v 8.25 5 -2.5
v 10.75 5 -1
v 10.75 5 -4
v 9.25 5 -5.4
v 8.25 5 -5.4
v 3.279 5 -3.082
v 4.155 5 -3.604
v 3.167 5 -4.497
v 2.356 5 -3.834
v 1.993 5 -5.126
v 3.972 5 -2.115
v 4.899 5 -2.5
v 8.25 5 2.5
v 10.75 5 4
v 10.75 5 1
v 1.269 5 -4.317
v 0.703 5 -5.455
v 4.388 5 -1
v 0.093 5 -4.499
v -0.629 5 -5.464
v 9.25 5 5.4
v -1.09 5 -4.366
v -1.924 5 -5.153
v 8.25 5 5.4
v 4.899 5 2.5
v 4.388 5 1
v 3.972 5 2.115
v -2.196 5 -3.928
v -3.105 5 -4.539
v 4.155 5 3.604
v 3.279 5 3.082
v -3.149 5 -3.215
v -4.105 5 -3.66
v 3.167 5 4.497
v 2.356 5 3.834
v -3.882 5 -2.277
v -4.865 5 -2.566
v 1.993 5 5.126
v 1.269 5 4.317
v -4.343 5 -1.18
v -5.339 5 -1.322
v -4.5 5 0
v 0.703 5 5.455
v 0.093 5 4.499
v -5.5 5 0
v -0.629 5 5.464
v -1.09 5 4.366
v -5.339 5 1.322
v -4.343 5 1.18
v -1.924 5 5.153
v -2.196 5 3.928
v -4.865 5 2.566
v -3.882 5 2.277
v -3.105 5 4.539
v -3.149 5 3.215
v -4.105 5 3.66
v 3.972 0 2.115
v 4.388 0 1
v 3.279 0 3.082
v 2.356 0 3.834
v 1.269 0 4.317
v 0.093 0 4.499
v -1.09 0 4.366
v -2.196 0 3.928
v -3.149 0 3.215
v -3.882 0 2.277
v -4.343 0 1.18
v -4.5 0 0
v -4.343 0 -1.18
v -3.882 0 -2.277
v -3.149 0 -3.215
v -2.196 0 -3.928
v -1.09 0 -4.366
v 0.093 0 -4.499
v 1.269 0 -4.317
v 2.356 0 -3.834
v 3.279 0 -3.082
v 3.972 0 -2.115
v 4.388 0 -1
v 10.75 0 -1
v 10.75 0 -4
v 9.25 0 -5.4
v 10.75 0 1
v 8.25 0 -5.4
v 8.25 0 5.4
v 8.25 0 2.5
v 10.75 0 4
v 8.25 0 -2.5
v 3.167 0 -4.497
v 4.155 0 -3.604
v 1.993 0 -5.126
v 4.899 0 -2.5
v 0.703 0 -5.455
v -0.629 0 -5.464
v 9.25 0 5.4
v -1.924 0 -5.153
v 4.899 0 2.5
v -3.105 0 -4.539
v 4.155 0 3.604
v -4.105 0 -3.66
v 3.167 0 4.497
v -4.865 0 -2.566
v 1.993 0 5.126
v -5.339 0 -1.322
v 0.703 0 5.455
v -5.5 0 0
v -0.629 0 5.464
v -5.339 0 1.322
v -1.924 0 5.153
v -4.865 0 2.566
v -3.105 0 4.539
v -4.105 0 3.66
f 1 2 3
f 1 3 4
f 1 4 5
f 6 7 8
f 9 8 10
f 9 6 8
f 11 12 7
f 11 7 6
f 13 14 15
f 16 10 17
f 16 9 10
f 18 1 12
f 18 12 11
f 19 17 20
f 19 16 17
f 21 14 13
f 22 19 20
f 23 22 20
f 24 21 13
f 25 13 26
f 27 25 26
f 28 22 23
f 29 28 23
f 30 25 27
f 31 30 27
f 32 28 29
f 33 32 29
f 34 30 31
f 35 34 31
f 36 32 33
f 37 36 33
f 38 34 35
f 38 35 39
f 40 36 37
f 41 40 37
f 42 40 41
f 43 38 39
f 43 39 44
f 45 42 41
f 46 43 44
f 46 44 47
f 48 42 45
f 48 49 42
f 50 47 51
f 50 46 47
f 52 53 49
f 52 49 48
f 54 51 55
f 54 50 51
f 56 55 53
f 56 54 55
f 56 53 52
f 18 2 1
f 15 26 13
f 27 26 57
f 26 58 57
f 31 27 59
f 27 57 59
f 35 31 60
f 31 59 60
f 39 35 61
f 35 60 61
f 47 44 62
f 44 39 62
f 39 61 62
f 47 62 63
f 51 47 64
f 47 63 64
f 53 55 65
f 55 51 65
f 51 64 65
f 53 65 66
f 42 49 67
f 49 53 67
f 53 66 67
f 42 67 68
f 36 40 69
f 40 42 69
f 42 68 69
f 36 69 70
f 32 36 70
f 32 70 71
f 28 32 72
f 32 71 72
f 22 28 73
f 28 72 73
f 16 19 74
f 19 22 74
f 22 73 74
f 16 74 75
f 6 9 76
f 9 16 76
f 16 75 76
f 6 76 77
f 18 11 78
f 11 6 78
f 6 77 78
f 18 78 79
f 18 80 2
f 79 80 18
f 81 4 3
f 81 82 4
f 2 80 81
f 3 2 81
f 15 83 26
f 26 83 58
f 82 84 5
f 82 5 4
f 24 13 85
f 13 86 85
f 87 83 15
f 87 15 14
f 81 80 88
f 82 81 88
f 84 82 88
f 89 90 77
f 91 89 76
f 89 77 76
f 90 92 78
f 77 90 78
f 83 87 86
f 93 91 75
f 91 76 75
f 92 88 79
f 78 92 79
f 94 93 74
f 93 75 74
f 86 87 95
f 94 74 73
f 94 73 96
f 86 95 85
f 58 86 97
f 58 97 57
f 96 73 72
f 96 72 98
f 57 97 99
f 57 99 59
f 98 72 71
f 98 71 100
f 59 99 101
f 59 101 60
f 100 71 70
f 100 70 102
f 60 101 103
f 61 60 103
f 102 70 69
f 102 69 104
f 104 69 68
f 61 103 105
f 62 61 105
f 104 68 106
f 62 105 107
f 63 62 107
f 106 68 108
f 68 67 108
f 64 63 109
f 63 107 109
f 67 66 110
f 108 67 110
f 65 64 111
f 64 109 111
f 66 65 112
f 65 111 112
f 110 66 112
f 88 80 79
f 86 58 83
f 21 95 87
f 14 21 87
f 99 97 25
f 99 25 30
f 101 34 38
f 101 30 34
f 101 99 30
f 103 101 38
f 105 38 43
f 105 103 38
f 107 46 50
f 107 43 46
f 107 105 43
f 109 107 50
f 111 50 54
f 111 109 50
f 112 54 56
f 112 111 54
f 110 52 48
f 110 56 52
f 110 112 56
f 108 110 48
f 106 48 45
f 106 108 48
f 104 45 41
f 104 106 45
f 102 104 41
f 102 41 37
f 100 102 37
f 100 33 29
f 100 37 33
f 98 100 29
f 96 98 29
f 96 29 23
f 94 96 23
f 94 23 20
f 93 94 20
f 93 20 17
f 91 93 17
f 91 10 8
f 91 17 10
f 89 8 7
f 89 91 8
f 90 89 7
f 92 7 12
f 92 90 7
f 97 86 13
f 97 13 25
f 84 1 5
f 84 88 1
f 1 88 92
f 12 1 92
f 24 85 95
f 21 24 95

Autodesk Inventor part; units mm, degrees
ref_plane "YZ Plane" through (0, 0, 0) normal (1, 0, 0) x (0, 1, 0)
ref_plane "XZ Plane" through (0, 0, 0) normal (0, 1, 0) x (-1, 0, 0)
ref_plane "XY Plane" through (0, 0, 0) normal (0, 0, 1) x (1, 0, 0)
sketch "Sketch1" plane through (0, 0, 0) normal (0, 1, 0) x (-1, 0, 0)
  arc A0 (-4.3875, -1) -> (-4.3875, 1) centre (0, 0) ccw
  line L0 (-10.75, -1) -> (-4.3875, -1)
  line L1 (-8.25, -2.5) -> (-4.899, -2.5)
  line L2 (0, 0) -> (18.2262, 0) construction
  line L3 (-8.25, -2.5) -> (-8.25, -5.4)
  line L4 (-10.75, -1) -> (-10.75, -4)
  line L5 (-8.25, -5.4) -> (-9.25, -5.4)
  line L6 (-9.25, -5.4) -> (-10.75, -4)
  line L7 (-10.75, 1) -> (-4.3875, 1)
  line L8 (-8.25, 2.5) -> (-4.899, 2.5)
  line L9 (-8.25, 2.5) -> (-8.25, 5.4)
  line L10 (-10.75, 1) -> (-10.75, 4)
  line L11 (-8.25, 5.4) -> (-9.25, 5.4)
  line L12 (-9.25, 5.4) -> (-10.75, 4)
  arc A1 (-4.899, -2.5) -> (-4.899, 2.5) centre (0, 0) ccw
  point P0 (-5.692, 1)
  dimension "d0" = 9
  dimension "d3" = 1.5
  dimension "d4" = 1
  dimension "d7" = 3
  dimension "d10" = 4.4
  dimension "d16" = 1
  dimension "d17" = 3.351
  dimension "d18" = 5.5
  dimension "d20" = 2.5
extrude "Extrusion1" add sketch "Sketch1" along normal blind 5
properties part number "V Slot Clip Wire Holder"
